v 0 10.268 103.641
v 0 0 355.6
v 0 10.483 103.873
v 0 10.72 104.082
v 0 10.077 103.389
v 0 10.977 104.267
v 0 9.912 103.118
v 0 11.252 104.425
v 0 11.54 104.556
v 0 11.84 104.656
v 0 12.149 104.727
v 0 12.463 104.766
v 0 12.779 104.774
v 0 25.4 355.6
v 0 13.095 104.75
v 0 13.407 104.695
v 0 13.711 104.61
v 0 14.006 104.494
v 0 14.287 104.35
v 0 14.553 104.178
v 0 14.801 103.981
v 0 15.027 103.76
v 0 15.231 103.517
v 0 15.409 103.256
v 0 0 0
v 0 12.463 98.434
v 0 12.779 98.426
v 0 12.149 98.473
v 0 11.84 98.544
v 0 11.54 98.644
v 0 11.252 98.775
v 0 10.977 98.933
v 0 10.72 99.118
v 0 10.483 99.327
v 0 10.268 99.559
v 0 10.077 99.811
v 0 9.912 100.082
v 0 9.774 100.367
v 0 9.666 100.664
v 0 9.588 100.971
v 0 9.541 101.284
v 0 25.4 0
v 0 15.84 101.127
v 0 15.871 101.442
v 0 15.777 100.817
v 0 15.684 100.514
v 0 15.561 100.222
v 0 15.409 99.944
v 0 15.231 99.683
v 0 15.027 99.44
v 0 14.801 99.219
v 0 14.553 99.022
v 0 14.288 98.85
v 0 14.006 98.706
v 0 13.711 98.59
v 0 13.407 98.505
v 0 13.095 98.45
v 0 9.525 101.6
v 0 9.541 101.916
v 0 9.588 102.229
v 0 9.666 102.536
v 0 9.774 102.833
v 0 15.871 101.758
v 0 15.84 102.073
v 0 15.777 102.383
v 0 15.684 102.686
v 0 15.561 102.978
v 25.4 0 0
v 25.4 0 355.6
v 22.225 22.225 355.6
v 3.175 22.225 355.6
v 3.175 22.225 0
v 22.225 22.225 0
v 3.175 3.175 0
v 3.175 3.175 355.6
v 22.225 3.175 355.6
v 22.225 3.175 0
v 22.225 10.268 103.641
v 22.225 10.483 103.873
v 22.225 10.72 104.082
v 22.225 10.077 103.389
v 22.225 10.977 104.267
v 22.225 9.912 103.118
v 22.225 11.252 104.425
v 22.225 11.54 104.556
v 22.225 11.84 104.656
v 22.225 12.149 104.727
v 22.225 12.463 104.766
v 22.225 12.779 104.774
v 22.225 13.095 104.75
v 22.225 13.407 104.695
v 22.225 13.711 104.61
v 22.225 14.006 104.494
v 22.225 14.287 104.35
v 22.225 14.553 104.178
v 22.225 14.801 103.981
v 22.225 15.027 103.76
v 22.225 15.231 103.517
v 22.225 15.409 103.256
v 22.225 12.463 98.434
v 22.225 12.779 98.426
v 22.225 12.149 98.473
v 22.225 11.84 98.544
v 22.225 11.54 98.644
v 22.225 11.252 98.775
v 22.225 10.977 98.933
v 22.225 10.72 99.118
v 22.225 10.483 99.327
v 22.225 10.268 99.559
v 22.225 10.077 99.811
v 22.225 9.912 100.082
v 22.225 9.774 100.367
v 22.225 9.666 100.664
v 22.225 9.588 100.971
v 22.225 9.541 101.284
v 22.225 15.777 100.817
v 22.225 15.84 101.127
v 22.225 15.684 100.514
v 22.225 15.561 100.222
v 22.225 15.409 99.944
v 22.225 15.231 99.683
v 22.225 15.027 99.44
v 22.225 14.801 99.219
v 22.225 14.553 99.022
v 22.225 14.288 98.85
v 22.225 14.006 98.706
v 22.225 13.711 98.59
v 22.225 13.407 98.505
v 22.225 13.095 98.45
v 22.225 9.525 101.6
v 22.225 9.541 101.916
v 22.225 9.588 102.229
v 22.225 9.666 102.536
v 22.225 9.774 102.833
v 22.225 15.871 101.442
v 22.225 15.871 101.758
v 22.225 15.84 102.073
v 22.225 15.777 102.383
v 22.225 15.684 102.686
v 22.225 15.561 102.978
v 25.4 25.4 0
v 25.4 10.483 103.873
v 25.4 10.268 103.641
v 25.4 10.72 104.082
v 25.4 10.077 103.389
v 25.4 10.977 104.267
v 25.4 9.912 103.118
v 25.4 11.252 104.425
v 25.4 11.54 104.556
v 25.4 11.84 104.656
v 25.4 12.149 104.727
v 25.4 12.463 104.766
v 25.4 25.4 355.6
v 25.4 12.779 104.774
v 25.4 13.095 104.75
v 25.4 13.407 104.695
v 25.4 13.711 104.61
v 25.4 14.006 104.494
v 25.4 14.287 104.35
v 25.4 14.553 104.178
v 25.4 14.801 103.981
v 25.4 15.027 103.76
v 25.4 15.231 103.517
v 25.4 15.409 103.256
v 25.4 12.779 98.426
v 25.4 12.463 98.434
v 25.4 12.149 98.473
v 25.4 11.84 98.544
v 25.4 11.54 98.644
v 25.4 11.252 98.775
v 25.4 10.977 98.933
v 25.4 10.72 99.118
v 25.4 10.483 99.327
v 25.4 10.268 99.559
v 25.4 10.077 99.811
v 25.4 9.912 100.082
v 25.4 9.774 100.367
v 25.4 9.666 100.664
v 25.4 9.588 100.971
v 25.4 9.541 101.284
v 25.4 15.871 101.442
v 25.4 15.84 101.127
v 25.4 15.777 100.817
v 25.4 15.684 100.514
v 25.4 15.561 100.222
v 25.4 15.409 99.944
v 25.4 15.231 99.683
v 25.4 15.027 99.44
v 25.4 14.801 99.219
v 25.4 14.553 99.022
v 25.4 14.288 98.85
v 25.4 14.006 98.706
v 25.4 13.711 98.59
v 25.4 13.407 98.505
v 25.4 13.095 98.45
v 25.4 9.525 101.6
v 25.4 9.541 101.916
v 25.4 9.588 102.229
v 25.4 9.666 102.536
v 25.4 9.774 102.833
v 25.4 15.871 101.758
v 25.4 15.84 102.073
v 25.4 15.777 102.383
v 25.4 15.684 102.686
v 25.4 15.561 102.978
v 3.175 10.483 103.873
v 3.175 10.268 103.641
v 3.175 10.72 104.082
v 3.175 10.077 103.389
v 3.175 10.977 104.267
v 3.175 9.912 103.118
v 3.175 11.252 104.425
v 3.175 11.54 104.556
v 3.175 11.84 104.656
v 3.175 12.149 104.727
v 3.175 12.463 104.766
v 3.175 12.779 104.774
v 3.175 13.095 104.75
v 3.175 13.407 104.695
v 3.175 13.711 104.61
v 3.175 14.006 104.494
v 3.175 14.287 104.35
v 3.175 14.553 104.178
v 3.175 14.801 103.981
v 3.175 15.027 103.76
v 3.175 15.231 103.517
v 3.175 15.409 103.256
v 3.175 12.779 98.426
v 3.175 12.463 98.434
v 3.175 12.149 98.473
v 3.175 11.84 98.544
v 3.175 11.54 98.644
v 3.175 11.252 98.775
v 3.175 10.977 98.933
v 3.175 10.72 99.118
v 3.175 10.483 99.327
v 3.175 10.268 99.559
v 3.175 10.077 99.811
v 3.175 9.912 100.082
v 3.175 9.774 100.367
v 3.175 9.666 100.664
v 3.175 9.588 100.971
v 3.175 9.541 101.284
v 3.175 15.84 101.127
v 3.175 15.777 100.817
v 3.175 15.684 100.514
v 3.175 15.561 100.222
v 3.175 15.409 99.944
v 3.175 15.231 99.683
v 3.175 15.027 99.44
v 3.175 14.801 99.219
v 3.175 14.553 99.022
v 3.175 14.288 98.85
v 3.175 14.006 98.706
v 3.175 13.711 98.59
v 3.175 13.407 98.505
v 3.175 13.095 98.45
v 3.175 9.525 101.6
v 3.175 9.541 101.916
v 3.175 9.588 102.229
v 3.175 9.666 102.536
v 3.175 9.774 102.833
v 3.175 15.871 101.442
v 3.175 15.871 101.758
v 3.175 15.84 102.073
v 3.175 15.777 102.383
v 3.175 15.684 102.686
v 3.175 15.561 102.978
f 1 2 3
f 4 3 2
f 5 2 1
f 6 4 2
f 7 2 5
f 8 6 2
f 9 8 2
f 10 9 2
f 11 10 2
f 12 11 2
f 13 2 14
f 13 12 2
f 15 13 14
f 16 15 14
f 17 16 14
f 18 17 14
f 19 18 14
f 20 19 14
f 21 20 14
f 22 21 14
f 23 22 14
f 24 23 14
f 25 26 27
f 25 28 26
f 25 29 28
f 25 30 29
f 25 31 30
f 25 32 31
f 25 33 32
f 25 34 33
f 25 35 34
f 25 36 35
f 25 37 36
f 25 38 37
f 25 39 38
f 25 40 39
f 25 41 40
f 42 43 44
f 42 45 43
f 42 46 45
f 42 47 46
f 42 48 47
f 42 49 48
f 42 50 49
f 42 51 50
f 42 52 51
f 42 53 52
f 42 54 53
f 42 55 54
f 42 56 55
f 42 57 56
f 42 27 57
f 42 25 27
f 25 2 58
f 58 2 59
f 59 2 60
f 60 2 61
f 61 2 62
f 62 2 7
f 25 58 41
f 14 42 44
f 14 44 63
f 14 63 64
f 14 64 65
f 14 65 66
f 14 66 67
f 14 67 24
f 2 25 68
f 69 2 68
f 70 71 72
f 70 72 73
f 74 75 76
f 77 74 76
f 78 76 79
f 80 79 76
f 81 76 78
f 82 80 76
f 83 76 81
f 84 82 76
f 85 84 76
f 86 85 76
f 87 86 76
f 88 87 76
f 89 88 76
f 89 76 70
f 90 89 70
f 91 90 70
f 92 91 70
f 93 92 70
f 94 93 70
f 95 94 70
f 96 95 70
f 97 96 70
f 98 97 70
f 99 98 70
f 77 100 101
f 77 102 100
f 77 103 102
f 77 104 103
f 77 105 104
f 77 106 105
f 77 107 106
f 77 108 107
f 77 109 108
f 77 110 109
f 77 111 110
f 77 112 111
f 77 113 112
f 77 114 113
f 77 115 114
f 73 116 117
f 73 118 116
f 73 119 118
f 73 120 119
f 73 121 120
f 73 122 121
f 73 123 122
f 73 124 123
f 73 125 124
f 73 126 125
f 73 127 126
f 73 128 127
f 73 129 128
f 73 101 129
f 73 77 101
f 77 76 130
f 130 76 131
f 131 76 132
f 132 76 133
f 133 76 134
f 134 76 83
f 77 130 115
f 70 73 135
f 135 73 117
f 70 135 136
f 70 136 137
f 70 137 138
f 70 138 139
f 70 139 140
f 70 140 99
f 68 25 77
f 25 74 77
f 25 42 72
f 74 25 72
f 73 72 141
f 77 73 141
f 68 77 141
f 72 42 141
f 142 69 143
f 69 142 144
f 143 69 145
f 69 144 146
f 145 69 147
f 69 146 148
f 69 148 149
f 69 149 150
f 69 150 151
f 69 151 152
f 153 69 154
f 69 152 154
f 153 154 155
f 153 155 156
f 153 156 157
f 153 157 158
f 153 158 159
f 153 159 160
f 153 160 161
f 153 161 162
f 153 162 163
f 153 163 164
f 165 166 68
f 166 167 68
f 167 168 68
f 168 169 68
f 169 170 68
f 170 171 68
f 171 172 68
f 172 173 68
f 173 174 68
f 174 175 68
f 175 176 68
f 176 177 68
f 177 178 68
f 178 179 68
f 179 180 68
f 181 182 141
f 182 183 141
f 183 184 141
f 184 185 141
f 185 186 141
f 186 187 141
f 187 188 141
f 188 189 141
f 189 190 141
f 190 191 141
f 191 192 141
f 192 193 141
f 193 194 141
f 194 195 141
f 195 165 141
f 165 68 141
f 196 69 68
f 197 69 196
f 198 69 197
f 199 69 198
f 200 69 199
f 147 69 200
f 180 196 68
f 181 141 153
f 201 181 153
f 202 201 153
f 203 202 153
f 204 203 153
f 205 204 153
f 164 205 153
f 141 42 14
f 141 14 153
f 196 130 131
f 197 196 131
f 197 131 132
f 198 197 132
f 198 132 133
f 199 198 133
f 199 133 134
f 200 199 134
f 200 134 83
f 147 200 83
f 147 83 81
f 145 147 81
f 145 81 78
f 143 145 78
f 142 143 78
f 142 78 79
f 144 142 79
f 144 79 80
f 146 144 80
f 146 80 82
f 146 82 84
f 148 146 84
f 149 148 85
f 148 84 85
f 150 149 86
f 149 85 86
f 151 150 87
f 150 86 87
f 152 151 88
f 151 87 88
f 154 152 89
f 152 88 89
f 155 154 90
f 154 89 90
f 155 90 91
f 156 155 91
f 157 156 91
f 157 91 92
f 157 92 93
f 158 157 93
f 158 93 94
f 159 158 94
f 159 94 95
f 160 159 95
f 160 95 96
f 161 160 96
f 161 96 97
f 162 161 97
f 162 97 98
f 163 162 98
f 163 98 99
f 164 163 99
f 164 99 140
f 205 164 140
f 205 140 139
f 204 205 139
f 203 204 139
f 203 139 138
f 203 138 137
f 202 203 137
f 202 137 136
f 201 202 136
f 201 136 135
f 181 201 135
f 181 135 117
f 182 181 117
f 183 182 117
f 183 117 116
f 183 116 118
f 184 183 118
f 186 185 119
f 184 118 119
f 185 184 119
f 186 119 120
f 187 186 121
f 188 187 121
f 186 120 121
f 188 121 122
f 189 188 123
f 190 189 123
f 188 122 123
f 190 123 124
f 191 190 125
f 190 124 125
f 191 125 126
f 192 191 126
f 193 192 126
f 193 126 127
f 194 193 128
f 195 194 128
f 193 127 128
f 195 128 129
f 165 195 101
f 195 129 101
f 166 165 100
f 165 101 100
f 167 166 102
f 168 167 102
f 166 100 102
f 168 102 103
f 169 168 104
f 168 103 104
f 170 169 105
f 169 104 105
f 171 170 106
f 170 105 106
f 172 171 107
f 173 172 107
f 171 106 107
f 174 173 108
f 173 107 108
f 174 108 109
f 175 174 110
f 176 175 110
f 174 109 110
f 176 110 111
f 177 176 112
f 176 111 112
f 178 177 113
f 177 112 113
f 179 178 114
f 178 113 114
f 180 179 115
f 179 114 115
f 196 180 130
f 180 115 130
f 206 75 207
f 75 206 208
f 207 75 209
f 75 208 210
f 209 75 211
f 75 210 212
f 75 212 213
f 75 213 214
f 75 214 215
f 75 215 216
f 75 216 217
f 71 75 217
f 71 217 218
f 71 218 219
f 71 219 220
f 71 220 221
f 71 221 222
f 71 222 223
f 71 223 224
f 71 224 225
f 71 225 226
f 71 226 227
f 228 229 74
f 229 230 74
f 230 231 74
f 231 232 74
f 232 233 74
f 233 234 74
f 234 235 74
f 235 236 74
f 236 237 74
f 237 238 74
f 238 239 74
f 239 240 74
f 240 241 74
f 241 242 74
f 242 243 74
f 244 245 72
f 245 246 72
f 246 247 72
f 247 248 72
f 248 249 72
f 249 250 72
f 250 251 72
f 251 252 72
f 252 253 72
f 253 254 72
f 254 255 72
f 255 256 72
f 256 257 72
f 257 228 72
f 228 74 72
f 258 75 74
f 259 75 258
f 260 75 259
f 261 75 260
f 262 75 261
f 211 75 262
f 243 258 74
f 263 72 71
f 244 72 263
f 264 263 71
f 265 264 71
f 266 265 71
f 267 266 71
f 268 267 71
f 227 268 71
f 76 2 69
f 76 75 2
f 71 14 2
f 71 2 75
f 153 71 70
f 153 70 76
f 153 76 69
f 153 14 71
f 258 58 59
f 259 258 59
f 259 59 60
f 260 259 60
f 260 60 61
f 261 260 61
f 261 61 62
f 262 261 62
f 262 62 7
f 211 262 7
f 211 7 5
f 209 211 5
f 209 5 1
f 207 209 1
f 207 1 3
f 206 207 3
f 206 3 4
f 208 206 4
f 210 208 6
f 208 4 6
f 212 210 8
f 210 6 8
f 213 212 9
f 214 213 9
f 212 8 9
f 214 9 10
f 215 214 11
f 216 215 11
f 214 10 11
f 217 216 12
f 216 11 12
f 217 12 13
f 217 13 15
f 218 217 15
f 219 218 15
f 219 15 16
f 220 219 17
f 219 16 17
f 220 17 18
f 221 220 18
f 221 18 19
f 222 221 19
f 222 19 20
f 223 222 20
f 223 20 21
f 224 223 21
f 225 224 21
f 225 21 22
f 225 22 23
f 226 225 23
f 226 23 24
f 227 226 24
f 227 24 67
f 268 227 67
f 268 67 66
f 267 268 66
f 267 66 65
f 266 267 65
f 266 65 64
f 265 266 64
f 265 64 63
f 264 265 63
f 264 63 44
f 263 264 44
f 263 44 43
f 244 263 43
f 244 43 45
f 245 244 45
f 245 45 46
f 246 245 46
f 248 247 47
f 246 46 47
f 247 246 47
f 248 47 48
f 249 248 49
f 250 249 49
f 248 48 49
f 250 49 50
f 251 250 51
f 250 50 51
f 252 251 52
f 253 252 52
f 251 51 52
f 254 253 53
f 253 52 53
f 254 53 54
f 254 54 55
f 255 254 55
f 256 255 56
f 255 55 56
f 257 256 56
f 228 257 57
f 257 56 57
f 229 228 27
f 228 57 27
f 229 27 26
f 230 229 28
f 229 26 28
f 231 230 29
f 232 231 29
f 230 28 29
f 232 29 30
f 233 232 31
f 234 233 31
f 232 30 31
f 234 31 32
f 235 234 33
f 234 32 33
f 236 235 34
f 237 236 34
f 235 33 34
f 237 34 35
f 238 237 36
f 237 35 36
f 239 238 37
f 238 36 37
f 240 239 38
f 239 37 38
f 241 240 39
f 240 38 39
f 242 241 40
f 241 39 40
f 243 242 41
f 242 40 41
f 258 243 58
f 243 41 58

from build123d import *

# Parameters (mm, degrees)
SKETCH1_W           = 25.4
SKETCH1_H           = 25.4
SKETCH1_W_2         = 19.05
SKETCH1_H_2         = 19.05
BOSS_EXTRUDE1_DEPTH = 355.6
SKETCH2_R           = 3.175
CUT_EXTRUDE1_DEPTH  = 358.409680899


with BuildPart() as part:
    # Sketch1 → Boss-Extrude1 (new body)
    with BuildSketch(Plane.XY):
        with Locations((12.7, 12.7)):
            Rectangle(SKETCH1_W, SKETCH1_H)
        with Locations((12.7, 12.7)):
            Rectangle(SKETCH1_W_2, SKETCH1_H_2, mode=Mode.SUBTRACT)
    extrude(amount=BOSS_EXTRUDE1_DEPTH)

    # Sketch2 → Cut-Extrude1 (cut, through all)
    with BuildSketch(Plane.ZY):
        with Locations(Location((101.6, 12.7, 0), (0, 0, 270))):
            Circle(SKETCH2_R)
    extrude(amount=-CUT_EXTRUDE1_DEPTH, mode=Mode.SUBTRACT)


solid = part.part
